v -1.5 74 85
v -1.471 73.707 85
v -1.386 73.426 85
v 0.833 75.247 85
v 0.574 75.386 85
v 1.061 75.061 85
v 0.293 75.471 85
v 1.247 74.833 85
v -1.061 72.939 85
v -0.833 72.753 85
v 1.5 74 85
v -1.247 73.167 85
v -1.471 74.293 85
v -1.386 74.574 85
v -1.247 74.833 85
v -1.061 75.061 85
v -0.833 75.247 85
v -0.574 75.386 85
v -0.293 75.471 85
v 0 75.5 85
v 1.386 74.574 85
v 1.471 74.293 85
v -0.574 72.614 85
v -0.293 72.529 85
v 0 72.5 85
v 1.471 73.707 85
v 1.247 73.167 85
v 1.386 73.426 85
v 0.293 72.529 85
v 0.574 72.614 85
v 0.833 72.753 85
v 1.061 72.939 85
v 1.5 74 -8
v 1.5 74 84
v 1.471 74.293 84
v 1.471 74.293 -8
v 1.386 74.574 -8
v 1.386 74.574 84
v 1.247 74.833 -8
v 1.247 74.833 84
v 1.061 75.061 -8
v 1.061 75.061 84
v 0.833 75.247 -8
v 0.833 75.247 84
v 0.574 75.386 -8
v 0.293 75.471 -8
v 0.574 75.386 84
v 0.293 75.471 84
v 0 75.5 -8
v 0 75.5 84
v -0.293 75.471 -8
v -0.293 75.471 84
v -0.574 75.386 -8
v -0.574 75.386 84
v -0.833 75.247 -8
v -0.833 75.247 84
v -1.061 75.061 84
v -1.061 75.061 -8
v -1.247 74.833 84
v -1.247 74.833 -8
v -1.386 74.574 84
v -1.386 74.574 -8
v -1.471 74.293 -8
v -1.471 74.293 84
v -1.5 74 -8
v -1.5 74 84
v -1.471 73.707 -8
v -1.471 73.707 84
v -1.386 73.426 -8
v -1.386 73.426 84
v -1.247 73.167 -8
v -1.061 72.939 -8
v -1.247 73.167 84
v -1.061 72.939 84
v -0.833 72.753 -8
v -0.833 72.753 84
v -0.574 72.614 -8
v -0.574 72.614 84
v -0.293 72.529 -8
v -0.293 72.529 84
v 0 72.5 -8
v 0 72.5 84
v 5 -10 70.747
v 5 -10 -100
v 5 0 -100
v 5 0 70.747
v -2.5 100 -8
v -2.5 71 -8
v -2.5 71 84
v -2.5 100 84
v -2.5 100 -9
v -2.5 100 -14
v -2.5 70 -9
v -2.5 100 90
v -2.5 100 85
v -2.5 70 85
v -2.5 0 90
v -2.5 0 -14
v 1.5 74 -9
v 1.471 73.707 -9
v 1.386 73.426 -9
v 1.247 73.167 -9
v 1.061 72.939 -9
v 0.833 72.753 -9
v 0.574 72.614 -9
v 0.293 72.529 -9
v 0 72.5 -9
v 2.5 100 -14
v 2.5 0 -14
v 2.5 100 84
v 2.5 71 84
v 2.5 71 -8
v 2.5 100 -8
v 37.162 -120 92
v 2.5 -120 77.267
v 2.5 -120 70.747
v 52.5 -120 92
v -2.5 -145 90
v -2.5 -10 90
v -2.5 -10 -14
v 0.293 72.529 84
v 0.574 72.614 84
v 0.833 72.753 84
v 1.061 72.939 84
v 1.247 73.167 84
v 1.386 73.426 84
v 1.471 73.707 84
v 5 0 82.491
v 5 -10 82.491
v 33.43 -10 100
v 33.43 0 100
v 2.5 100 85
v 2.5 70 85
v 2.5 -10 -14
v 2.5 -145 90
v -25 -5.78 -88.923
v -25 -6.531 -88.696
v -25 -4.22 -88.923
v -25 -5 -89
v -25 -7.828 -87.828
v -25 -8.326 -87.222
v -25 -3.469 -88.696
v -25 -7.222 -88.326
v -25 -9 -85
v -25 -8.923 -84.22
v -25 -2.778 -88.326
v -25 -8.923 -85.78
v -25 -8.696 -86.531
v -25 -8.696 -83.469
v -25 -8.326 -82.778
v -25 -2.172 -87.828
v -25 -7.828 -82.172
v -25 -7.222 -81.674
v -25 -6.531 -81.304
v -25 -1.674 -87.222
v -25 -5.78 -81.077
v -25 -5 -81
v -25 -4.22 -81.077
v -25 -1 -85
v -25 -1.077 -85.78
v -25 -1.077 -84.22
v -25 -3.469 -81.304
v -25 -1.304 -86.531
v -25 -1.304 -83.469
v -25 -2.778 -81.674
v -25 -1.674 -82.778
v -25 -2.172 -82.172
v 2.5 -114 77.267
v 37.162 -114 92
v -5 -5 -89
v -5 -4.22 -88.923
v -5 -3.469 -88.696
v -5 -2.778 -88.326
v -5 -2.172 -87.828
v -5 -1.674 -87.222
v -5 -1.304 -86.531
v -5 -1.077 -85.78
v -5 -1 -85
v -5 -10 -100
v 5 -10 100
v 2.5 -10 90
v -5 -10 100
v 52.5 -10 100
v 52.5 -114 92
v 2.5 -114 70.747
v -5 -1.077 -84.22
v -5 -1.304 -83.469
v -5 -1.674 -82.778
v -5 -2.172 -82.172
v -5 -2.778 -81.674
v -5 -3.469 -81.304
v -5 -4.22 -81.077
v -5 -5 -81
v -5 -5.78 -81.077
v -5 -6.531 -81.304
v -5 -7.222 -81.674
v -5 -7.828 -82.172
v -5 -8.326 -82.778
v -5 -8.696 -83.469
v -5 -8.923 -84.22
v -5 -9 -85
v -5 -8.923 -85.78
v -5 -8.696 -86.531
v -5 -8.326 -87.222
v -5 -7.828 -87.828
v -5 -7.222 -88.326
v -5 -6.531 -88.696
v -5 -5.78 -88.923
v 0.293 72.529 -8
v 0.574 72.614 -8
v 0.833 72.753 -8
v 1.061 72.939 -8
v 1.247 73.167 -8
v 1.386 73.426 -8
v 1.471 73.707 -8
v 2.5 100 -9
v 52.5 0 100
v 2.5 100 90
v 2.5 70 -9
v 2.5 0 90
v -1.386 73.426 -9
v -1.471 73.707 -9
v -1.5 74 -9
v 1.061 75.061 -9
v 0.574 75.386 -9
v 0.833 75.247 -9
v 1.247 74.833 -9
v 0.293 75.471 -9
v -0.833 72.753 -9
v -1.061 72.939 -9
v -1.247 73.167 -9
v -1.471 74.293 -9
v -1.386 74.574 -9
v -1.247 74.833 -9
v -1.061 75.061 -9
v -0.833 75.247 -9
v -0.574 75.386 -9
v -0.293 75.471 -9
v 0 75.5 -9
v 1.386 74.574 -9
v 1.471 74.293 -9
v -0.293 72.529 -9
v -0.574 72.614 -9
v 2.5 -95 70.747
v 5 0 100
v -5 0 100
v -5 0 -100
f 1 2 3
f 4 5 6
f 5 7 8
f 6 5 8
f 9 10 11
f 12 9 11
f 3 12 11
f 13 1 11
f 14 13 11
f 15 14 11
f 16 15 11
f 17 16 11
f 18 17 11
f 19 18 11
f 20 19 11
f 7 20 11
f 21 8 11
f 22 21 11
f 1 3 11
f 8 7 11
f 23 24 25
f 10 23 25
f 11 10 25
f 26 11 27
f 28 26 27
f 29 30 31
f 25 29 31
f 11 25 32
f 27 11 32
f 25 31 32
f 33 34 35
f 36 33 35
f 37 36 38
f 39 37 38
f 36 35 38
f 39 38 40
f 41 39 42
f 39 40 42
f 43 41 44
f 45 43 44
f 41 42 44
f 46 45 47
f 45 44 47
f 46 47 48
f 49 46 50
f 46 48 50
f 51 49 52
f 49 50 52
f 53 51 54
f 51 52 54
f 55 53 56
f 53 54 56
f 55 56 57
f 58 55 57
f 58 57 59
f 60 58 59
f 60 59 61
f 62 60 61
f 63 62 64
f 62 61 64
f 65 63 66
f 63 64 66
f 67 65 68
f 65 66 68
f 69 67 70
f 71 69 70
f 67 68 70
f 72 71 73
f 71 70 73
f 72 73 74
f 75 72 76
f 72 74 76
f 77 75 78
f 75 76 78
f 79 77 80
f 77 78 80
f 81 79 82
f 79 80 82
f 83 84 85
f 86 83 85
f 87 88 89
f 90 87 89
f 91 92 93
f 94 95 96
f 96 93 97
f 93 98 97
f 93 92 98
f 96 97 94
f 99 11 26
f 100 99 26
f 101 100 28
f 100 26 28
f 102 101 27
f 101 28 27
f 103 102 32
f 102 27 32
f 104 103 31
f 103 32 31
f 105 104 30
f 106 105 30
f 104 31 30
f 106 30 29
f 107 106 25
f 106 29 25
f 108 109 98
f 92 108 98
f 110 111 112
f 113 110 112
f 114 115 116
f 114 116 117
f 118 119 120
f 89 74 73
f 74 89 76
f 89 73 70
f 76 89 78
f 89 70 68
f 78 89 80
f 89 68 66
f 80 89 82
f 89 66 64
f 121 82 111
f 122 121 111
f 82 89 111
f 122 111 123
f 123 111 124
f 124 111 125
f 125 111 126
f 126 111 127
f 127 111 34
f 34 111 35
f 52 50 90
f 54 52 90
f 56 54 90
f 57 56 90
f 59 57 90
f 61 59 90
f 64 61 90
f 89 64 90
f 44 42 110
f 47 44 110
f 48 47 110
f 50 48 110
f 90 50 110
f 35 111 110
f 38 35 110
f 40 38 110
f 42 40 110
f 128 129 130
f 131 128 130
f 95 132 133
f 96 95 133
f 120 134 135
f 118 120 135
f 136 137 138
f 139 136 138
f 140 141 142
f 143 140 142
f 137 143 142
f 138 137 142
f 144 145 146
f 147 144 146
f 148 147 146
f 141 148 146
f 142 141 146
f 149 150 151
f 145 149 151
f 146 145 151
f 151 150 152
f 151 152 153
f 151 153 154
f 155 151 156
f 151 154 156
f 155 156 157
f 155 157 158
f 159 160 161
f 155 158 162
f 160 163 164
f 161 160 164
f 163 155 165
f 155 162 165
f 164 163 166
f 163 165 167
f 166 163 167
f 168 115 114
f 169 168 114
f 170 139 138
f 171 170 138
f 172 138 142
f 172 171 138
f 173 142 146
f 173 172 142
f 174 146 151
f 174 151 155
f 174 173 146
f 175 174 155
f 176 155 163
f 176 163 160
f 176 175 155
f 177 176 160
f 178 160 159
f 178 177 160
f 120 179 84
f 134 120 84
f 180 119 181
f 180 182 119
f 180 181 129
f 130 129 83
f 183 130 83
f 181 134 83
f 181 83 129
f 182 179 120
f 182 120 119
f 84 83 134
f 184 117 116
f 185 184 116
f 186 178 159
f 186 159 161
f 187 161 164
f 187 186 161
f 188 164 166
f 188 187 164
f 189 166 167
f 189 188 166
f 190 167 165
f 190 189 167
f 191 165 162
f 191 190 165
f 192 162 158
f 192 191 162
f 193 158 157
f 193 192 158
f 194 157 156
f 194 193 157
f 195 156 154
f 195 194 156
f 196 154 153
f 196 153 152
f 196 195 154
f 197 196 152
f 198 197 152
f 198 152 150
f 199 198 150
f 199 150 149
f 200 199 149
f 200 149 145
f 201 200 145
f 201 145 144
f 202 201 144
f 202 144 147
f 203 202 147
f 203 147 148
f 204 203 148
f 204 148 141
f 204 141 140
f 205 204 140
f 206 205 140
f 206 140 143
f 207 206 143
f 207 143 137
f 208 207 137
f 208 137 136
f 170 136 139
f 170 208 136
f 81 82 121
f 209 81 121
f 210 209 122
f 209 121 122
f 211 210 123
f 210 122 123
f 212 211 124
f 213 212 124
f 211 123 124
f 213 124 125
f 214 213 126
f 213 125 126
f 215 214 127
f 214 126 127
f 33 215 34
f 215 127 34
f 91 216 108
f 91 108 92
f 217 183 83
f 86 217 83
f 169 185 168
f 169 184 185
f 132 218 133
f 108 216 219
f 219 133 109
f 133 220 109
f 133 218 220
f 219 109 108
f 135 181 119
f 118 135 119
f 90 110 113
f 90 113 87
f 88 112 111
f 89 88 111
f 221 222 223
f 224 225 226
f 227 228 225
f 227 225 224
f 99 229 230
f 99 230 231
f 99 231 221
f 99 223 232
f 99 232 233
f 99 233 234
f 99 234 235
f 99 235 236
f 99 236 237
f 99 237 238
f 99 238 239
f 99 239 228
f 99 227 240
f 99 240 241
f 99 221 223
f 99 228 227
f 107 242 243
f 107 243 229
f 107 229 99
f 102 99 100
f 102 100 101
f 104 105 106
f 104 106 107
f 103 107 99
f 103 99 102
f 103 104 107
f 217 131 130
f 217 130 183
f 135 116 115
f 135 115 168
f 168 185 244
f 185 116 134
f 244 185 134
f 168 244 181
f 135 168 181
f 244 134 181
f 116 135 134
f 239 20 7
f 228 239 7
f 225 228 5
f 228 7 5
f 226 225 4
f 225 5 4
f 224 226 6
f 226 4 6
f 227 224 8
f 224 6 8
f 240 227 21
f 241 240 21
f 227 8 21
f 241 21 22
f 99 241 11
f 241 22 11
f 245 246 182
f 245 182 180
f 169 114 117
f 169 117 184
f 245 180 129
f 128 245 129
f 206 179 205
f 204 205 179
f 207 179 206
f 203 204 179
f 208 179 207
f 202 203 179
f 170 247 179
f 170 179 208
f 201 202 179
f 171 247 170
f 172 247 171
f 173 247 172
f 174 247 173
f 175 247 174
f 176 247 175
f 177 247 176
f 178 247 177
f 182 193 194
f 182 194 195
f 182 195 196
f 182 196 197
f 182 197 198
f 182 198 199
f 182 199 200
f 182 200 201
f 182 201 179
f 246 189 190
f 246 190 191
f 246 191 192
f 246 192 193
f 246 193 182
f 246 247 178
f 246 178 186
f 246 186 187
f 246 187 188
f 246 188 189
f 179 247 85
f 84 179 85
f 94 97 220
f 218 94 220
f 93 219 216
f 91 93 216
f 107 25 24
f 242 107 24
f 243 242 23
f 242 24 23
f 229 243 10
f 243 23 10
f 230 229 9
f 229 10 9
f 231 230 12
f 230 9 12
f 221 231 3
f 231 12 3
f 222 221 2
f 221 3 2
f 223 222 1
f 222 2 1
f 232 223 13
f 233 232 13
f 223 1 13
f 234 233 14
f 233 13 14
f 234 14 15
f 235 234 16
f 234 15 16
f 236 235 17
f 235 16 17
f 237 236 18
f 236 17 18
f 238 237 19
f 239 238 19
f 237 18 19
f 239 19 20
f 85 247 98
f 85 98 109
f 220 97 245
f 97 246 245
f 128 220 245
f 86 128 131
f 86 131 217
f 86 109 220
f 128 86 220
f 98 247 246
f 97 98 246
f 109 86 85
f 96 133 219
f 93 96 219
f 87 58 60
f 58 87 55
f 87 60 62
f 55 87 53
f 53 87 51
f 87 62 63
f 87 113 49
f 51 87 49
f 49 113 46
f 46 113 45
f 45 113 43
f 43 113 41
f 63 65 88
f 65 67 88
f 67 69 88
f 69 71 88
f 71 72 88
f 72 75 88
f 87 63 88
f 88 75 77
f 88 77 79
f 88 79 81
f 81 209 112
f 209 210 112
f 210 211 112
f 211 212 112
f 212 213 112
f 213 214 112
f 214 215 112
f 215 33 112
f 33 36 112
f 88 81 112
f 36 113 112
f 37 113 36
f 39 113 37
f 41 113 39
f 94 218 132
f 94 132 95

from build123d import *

# Parameters (mm, degrees)
F0_W      = 10
F0_H      = 200
F1_DEPTH  = 10
F3_DEPTH  = 135
F5_DEPTH  = 7.501
F6_W      = 5
F6_H      = 10
F6_H_2    = 9.253
F7_DEPTH  = 57.5
F9_DEPTH  = 30
F11_DEPTH = 100
F13_DEPTH = 5
F15_DEPTH = 92
F17_DEPTH = 94
F19_DEPTH = 25
F20_W     = 6
F20_H     = 6
F20_H_2   = 7.253
F20_H_3   = 2
F21_DEPTH = 50
F23_DEPTH = 25


# Not quite as in the source:
# - a feature names something its author has since deleted; it is built from what else it names


with BuildPart() as f1:
    # F0 (on Front) → F1 (new body)
    with BuildSketch(Plane.XZ):
        Rectangle(F0_W, F0_H)
    extrude(amount=F1_DEPTH)

    # F2 (on face) → F3 (join)
    with BuildSketch(Plane.XZ.offset(10)):
        Polygon((2.5, 90), (0, 90), (-2.5, 90), (-2.5, -14), (0, -14), (2.5, -14), align=None)
    extrude(amount=F3_DEPTH)

    # F4 (on face) → F5 (cut, through all)
    with BuildSketch(Plane.YZ.offset(2.5)):
        Polygon((-10, -14), (-145, 90), (-145, -14), align=None)
    extrude(amount=-F5_DEPTH, mode=Mode.SUBTRACT)

    # F6 (on face) → F7 (join)
    with BuildSketch(Plane(origin=(-5, 0, 0), x_dir=(0, -1, 0), z_dir=(-1, 0, 0))):
        with Locations((7.5, 75.747)):
            Rectangle(F6_W, F6_H)
        with Locations((2.5, 75.747)):
            Rectangle(F6_W, F6_H)
        with Locations((2.5, 85.3735)):
            Rectangle(F6_W, F6_H_2)
        with Locations((7.5, 85.3735)):
            Rectangle(F6_W, F6_H_2)
        with Locations((2.5, 95)):
            Rectangle(F6_W, F6_H)
        with Locations((7.5, 95)):
            Rectangle(F6_W, F6_H)
    extrude(amount=-F7_DEPTH)

    # F8 (on face) → F9 (join)
    with BuildSketch(Plane.YZ.offset(5)):
        with BuildLine():
            ThreePointArc((-1, -85), (-7.8284271247, -82.1715728753), (-5, -89))
            ThreePointArc((-5, -89), (-2.1715728753, -87.8284271247), (-1, -85))
        make_face()
    extrude(amount=-F9_DEPTH)

    # F10 (on face) → F11 (join)
    with BuildSketch(Plane(origin=(0, 0, 0), x_dir=(-1, 0, 0), z_dir=(0, 1, 0))):
        Polygon((2.5, 90), (0, 90), (-2.5, 90), (-2.5, -14), (2.5, -14), align=None)
    extrude(amount=F11_DEPTH)

    # F12 (on face) → F13 (cut, through all)
    with BuildSketch(Plane.YZ.offset(2.5)):
        Polygon((100, 84), (100, 85), (70, 85), (70, -9), (100, -9), (100, -8), (71, -8), (71, 84), align=None)
    extrude(amount=-F13_DEPTH, mode=Mode.SUBTRACT)

    # F14 (on face) → F15 (cut, through all)
    with BuildSketch(Plane.XY.offset(84)):
        with BuildLine():
            ThreePointArc((0, 72.5), (1.0606601718, 72.9393398282), (1.5, 74))
            ThreePointArc((1.5, 74), (-1.0606601718, 75.0606601718), (0, 72.5))
        make_face()
    extrude(amount=-F15_DEPTH, mode=Mode.SUBTRACT)

    # F18 (on face) → F19 (cut)
    with BuildSketch(Plane.XZ.offset(10)):
        Polygon((5, 100), (5, 82.4912516314), (33.4300942641, 100), align=None)
        Polygon((52.5, 100), (5, 70.747), (52.5, 70.747), align=None)
    extrude(amount=-F19_DEPTH, mode=Mode.SUBTRACT)

    # F20 (on face) → F21 (join)
    with BuildSketch(Plane.YZ.offset(2.5)):
        with Locations((-117, 73.747)):
            Rectangle(F20_W, F20_H)
        with Locations((-117, 80.3735)):
            Rectangle(F20_W, F20_H_2)
        with Locations((-117, 87)):
            Rectangle(F20_W, F20_H)
        with Locations((-117, 91)):
            Rectangle(F20_W, F20_H_3)
    extrude(amount=F21_DEPTH)

    # F22 (on face) → F23 (cut)
    with BuildSketch(Plane.XZ.offset(120)):
        Polygon((2.5, 90), (2.5, 77.2665349627), (37.1620830878, 92), (2.5, 92), align=None)
        Polygon((52.5, 92), (2.5, 70.747), (52.5, 70.747), align=None)
    extrude(amount=-F23_DEPTH, mode=Mode.SUBTRACT)


with BuildPart() as f17:
    # F16 (on face) → F17 (new body, through all)
    with BuildSketch(Plane(origin=(0, 0, 85), x_dir=(1, 0, 0), z_dir=(0, 0, -1))):
        with BuildLine():
            ThreePointArc((1.5, -74), (1.0606601718, -72.9393398282), (0, -72.5))
            Line((0, -72.5), (0, -74))
            Line((0, -74), (0, -75.5))
            ThreePointArc((0, -75.5), (1.0606601718, -75.0606601718), (1.5, -74))
        make_face()
        with BuildLine():
            Line((0, -74), (0, -72.5))
            ThreePointArc((0, -72.5), (-1.5, -74), (0, -75.5))
            Line((0, -75.5), (0, -74))
        make_face()
    extrude(amount=F17_DEPTH)


solid = Compound([f1.part, f17.part])
